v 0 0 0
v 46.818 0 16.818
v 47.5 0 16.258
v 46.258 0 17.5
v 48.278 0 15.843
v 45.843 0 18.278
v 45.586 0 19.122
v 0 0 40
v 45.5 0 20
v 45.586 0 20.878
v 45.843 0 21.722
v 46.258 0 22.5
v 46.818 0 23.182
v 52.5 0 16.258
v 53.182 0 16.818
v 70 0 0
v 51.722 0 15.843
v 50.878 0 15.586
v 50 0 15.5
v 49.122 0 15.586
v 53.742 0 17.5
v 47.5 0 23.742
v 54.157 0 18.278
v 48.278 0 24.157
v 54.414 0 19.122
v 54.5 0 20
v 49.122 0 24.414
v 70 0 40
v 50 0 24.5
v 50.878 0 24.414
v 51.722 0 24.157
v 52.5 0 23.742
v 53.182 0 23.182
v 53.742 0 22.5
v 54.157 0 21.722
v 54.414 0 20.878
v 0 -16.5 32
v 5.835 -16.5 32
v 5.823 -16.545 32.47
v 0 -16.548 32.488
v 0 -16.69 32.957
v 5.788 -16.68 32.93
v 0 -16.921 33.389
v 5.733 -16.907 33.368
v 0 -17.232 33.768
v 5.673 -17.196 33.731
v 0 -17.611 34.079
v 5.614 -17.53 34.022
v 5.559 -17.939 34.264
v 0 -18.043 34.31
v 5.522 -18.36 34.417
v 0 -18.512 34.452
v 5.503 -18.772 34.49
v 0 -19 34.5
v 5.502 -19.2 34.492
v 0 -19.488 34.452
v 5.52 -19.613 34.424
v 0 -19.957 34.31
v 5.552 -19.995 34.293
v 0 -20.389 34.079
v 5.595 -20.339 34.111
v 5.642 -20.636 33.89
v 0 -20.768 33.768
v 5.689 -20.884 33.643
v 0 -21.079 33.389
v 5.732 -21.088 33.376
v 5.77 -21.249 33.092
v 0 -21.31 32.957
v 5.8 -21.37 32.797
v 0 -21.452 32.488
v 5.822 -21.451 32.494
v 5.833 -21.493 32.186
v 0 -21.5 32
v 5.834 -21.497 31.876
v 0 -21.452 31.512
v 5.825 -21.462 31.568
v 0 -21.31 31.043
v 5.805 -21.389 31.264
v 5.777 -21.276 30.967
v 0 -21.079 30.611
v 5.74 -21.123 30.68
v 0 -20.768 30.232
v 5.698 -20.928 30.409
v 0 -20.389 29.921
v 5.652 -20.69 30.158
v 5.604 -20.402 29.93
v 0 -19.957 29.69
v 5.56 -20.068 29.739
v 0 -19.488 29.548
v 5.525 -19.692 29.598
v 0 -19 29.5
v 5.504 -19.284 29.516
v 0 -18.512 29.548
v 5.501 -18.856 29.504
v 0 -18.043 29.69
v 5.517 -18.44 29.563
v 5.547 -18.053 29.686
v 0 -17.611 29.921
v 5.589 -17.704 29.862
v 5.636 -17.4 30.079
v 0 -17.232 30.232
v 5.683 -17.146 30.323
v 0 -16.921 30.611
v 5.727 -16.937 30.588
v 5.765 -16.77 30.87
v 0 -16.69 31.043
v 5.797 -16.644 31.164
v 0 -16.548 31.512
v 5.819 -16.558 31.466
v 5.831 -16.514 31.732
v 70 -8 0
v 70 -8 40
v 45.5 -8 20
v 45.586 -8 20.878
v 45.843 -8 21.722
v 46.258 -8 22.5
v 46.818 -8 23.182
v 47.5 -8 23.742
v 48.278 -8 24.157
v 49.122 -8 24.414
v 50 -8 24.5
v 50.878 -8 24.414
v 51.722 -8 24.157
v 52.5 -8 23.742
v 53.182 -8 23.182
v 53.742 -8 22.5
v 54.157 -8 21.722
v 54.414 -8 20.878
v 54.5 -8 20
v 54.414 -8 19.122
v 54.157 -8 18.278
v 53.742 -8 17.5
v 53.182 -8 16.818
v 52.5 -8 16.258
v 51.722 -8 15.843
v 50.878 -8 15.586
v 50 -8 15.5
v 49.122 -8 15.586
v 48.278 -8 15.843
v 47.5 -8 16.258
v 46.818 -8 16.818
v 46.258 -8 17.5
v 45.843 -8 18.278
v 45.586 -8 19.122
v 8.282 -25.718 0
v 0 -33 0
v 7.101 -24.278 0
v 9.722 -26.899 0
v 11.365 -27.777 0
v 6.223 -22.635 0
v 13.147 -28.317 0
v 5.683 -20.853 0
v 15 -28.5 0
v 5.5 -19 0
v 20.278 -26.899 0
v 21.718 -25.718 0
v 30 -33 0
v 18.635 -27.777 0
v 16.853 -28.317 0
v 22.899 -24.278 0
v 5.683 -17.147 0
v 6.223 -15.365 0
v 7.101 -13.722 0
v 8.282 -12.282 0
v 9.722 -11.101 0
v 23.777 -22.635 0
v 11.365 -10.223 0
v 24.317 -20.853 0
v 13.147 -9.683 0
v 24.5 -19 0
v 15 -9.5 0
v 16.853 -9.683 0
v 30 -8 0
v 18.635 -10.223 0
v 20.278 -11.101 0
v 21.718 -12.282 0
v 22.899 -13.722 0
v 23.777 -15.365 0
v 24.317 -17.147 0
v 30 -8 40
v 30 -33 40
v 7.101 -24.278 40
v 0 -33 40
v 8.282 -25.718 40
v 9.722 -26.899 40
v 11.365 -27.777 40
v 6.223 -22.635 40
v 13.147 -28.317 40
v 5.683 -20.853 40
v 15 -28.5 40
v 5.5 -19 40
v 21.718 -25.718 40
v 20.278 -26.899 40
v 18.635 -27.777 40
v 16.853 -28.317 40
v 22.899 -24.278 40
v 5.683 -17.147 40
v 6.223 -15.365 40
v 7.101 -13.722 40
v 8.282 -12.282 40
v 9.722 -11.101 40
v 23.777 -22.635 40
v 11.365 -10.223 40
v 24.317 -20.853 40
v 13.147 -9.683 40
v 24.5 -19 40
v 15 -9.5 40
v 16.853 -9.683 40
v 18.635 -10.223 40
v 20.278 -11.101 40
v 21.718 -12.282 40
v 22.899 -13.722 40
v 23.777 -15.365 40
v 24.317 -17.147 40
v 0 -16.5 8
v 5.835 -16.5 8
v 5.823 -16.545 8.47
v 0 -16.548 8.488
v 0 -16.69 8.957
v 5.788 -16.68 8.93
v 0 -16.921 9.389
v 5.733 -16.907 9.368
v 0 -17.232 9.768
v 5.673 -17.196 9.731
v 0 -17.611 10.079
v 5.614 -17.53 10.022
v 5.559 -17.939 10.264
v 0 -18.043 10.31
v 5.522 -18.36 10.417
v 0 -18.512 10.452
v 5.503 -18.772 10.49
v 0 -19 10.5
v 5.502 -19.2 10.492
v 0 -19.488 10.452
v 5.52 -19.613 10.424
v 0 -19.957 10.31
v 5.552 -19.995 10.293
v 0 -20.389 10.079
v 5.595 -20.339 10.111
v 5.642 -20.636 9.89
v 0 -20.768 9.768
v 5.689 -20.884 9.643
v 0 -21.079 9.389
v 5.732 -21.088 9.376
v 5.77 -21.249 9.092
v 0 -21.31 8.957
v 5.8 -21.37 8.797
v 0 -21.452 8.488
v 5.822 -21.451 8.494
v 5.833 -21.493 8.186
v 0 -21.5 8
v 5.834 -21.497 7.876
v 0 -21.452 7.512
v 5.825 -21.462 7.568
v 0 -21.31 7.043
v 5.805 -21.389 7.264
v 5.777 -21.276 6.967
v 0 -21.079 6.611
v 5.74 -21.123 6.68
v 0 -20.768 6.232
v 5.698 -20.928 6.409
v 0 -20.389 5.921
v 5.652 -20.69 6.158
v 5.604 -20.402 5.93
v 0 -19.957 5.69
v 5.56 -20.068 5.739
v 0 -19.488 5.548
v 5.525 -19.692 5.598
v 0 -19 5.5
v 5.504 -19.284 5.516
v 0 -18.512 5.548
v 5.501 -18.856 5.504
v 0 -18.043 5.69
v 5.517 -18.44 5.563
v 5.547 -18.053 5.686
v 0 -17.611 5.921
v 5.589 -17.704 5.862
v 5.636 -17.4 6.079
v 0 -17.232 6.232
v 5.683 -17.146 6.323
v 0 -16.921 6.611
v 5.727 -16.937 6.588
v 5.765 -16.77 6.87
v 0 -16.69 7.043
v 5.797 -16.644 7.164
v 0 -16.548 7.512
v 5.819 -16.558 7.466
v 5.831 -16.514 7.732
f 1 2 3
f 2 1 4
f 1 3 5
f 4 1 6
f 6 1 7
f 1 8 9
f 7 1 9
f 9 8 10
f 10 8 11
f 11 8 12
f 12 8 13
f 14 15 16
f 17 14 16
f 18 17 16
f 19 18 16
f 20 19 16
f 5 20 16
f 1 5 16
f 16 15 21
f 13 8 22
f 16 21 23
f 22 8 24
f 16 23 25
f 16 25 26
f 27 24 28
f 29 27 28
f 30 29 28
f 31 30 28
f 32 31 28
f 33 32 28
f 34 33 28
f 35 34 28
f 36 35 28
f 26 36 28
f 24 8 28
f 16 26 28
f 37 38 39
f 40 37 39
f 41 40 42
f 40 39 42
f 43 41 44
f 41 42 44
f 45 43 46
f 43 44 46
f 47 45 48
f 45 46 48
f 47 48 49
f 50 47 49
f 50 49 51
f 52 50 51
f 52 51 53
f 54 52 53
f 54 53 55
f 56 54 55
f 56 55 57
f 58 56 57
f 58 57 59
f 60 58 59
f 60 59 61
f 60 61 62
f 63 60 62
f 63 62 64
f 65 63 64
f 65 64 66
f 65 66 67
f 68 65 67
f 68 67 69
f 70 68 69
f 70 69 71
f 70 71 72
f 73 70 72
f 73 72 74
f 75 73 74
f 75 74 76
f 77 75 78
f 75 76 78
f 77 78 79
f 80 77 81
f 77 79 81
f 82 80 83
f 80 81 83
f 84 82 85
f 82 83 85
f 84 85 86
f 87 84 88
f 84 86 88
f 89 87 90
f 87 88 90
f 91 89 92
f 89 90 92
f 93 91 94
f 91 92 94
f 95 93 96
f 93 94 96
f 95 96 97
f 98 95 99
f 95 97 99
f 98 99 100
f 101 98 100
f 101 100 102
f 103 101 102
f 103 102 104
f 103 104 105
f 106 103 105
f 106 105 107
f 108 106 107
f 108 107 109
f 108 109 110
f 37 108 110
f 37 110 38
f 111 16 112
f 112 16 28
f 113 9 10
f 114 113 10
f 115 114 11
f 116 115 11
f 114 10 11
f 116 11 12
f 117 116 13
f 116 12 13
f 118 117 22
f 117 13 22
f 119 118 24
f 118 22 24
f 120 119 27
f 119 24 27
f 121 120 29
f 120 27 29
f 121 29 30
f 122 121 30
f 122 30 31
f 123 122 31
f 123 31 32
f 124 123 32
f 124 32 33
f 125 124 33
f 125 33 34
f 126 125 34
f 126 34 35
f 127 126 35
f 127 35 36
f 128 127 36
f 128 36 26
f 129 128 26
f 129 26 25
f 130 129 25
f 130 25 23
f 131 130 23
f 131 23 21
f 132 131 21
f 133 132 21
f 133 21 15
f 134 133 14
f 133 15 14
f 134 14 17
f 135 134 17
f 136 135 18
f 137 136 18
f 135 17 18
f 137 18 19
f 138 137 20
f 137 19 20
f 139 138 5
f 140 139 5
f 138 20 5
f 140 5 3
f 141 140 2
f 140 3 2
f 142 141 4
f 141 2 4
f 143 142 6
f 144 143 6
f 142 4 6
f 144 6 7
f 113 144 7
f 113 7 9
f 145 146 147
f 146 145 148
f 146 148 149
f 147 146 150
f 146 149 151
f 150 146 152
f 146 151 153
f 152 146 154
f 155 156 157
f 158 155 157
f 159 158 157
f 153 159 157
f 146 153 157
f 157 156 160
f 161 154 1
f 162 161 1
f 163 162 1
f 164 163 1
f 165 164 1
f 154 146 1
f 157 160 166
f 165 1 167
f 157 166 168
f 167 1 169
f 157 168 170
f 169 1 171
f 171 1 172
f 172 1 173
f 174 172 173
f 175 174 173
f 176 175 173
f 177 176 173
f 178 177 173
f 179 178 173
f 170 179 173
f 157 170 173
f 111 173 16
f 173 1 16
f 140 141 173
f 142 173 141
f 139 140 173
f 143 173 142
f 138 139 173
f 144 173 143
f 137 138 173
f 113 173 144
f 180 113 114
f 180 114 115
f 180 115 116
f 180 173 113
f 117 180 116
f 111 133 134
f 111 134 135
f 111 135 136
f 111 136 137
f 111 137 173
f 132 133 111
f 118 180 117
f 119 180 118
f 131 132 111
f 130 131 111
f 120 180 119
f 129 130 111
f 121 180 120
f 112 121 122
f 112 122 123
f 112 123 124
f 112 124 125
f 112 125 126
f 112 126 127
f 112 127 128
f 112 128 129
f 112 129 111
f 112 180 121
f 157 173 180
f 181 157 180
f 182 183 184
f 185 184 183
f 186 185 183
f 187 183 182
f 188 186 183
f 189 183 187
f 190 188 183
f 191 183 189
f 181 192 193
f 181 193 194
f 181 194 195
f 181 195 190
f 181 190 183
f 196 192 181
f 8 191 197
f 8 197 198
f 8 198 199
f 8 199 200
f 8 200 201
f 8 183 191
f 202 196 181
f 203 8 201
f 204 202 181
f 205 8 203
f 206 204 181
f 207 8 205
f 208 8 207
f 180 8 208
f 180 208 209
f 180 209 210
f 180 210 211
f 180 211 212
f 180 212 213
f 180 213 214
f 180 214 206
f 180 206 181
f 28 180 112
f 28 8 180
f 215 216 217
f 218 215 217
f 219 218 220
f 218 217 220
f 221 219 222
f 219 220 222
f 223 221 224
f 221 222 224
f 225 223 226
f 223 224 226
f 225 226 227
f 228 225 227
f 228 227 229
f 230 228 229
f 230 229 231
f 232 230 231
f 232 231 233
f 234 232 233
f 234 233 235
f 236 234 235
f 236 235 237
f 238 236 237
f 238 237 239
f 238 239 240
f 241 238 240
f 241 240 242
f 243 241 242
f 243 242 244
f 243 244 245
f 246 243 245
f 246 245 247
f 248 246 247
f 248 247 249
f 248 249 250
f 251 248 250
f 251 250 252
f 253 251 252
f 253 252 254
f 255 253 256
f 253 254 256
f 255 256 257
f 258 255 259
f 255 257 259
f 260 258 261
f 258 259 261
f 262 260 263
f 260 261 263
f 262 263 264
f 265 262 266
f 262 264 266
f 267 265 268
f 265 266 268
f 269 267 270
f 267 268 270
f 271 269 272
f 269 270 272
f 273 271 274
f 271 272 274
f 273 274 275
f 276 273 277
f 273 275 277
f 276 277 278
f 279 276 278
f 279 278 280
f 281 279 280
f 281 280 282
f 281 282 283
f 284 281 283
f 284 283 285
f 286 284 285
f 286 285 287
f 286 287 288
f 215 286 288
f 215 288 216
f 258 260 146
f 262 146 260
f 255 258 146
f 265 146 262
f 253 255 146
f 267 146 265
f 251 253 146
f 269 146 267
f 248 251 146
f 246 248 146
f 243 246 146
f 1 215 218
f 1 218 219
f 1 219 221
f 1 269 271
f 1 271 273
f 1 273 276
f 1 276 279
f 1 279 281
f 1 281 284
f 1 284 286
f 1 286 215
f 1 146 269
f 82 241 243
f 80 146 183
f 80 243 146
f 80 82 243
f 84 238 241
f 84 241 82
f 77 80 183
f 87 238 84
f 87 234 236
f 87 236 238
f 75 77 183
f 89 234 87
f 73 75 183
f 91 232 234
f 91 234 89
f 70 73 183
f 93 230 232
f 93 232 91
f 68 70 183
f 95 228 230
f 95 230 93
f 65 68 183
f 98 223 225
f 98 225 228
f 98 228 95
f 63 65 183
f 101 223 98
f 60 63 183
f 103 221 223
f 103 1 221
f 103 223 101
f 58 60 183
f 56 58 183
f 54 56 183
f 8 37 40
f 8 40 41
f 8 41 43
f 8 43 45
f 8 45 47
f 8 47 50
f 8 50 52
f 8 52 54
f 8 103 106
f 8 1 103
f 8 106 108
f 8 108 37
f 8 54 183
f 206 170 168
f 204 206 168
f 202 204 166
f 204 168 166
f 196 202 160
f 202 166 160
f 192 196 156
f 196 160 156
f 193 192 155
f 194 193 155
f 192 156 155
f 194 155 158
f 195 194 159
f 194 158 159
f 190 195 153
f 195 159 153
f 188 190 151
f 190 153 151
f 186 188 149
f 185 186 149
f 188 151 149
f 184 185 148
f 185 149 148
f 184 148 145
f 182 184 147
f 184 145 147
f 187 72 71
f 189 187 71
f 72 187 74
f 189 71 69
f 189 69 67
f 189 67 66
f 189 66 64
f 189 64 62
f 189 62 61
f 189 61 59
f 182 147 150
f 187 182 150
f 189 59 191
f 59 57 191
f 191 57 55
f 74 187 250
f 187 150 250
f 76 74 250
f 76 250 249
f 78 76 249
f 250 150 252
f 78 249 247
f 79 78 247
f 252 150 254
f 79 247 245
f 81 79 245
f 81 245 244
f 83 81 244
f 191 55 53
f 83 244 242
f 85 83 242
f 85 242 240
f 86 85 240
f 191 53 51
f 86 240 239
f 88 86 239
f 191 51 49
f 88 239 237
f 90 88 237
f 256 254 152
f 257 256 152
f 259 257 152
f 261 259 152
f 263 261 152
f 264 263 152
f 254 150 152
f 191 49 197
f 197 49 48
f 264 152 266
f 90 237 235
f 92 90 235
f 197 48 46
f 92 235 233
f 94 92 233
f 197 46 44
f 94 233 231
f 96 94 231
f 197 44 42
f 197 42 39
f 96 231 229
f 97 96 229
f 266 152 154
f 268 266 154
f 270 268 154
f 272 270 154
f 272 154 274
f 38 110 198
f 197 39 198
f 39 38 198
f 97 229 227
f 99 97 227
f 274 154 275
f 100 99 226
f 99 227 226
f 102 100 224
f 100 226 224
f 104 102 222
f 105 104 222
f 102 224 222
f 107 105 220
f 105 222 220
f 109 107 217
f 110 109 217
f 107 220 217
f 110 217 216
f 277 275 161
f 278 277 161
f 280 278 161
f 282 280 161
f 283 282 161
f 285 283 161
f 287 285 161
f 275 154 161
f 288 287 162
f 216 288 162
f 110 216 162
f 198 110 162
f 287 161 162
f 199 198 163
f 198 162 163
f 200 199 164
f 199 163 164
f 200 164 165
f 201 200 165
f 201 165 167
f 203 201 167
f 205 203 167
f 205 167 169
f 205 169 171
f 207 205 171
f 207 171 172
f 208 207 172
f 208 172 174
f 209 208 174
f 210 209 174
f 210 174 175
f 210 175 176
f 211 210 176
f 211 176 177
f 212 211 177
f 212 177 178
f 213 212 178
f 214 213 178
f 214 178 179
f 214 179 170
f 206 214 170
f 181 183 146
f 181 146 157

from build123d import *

# Parameters (mm, degrees)
F0_W     = 70
F0_H     = 40
F1_DEPTH = 8
F2_W     = 30
F2_H     = 40
F3_DEPTH = 25
F4_R     = 9.5
F5_DEPTH = 40
F7_D     = 5
F7_DEPTH = 15
F7_TIP   = 1.5021515476
F9_D     = 9
F9_DEPTH = 15
F9_TIP   = 2.7038727856


with BuildPart() as f1:
    # F0 (on Front) → F1 (new body)
    with BuildSketch(Plane.XZ):
        with Locations((35, 20)):
            Rectangle(F0_W, F0_H)
    extrude(amount=F1_DEPTH)

    # F2 (on face) → F3 (join)
    with BuildSketch(Plane.XZ.offset(8)):
        with Locations((15, 20)):
            Rectangle(F2_W, F2_H)
    extrude(amount=F3_DEPTH)

    # F4 (on face) → F5 (cut)
    with BuildSketch(Plane(origin=(0, 0, 0), x_dir=(1, 0, 0), z_dir=(0, 0, -1))):
        with Locations((15, 19)):
            Circle(F4_R)
    extrude(amount=-F5_DEPTH, mode=Mode.SUBTRACT)

    # F7
    with Locations(Plane(origin=(0, 0, 0), x_dir=(0, -1, 0), z_dir=(-1, 0, 0))):
        with Locations((19, 32), (19, 8)):
            Hole(F7_D / 2, depth=F7_DEPTH)
            with Locations((0, 0, -(F7_DEPTH + F7_TIP / 2))):  # 118° drill point
                Cone(0, F7_D / 2, F7_TIP, mode=Mode.SUBTRACT)

    # F9
    with Locations(Plane.XZ.offset(8)):
        with Locations((50, 20)):
            Hole(F9_D / 2, depth=F9_DEPTH)
            with Locations((0, 0, -(F9_DEPTH + F9_TIP / 2))):  # 118° drill point
                Cone(0, F9_D / 2, F9_TIP, mode=Mode.SUBTRACT)


solid = f1.part
